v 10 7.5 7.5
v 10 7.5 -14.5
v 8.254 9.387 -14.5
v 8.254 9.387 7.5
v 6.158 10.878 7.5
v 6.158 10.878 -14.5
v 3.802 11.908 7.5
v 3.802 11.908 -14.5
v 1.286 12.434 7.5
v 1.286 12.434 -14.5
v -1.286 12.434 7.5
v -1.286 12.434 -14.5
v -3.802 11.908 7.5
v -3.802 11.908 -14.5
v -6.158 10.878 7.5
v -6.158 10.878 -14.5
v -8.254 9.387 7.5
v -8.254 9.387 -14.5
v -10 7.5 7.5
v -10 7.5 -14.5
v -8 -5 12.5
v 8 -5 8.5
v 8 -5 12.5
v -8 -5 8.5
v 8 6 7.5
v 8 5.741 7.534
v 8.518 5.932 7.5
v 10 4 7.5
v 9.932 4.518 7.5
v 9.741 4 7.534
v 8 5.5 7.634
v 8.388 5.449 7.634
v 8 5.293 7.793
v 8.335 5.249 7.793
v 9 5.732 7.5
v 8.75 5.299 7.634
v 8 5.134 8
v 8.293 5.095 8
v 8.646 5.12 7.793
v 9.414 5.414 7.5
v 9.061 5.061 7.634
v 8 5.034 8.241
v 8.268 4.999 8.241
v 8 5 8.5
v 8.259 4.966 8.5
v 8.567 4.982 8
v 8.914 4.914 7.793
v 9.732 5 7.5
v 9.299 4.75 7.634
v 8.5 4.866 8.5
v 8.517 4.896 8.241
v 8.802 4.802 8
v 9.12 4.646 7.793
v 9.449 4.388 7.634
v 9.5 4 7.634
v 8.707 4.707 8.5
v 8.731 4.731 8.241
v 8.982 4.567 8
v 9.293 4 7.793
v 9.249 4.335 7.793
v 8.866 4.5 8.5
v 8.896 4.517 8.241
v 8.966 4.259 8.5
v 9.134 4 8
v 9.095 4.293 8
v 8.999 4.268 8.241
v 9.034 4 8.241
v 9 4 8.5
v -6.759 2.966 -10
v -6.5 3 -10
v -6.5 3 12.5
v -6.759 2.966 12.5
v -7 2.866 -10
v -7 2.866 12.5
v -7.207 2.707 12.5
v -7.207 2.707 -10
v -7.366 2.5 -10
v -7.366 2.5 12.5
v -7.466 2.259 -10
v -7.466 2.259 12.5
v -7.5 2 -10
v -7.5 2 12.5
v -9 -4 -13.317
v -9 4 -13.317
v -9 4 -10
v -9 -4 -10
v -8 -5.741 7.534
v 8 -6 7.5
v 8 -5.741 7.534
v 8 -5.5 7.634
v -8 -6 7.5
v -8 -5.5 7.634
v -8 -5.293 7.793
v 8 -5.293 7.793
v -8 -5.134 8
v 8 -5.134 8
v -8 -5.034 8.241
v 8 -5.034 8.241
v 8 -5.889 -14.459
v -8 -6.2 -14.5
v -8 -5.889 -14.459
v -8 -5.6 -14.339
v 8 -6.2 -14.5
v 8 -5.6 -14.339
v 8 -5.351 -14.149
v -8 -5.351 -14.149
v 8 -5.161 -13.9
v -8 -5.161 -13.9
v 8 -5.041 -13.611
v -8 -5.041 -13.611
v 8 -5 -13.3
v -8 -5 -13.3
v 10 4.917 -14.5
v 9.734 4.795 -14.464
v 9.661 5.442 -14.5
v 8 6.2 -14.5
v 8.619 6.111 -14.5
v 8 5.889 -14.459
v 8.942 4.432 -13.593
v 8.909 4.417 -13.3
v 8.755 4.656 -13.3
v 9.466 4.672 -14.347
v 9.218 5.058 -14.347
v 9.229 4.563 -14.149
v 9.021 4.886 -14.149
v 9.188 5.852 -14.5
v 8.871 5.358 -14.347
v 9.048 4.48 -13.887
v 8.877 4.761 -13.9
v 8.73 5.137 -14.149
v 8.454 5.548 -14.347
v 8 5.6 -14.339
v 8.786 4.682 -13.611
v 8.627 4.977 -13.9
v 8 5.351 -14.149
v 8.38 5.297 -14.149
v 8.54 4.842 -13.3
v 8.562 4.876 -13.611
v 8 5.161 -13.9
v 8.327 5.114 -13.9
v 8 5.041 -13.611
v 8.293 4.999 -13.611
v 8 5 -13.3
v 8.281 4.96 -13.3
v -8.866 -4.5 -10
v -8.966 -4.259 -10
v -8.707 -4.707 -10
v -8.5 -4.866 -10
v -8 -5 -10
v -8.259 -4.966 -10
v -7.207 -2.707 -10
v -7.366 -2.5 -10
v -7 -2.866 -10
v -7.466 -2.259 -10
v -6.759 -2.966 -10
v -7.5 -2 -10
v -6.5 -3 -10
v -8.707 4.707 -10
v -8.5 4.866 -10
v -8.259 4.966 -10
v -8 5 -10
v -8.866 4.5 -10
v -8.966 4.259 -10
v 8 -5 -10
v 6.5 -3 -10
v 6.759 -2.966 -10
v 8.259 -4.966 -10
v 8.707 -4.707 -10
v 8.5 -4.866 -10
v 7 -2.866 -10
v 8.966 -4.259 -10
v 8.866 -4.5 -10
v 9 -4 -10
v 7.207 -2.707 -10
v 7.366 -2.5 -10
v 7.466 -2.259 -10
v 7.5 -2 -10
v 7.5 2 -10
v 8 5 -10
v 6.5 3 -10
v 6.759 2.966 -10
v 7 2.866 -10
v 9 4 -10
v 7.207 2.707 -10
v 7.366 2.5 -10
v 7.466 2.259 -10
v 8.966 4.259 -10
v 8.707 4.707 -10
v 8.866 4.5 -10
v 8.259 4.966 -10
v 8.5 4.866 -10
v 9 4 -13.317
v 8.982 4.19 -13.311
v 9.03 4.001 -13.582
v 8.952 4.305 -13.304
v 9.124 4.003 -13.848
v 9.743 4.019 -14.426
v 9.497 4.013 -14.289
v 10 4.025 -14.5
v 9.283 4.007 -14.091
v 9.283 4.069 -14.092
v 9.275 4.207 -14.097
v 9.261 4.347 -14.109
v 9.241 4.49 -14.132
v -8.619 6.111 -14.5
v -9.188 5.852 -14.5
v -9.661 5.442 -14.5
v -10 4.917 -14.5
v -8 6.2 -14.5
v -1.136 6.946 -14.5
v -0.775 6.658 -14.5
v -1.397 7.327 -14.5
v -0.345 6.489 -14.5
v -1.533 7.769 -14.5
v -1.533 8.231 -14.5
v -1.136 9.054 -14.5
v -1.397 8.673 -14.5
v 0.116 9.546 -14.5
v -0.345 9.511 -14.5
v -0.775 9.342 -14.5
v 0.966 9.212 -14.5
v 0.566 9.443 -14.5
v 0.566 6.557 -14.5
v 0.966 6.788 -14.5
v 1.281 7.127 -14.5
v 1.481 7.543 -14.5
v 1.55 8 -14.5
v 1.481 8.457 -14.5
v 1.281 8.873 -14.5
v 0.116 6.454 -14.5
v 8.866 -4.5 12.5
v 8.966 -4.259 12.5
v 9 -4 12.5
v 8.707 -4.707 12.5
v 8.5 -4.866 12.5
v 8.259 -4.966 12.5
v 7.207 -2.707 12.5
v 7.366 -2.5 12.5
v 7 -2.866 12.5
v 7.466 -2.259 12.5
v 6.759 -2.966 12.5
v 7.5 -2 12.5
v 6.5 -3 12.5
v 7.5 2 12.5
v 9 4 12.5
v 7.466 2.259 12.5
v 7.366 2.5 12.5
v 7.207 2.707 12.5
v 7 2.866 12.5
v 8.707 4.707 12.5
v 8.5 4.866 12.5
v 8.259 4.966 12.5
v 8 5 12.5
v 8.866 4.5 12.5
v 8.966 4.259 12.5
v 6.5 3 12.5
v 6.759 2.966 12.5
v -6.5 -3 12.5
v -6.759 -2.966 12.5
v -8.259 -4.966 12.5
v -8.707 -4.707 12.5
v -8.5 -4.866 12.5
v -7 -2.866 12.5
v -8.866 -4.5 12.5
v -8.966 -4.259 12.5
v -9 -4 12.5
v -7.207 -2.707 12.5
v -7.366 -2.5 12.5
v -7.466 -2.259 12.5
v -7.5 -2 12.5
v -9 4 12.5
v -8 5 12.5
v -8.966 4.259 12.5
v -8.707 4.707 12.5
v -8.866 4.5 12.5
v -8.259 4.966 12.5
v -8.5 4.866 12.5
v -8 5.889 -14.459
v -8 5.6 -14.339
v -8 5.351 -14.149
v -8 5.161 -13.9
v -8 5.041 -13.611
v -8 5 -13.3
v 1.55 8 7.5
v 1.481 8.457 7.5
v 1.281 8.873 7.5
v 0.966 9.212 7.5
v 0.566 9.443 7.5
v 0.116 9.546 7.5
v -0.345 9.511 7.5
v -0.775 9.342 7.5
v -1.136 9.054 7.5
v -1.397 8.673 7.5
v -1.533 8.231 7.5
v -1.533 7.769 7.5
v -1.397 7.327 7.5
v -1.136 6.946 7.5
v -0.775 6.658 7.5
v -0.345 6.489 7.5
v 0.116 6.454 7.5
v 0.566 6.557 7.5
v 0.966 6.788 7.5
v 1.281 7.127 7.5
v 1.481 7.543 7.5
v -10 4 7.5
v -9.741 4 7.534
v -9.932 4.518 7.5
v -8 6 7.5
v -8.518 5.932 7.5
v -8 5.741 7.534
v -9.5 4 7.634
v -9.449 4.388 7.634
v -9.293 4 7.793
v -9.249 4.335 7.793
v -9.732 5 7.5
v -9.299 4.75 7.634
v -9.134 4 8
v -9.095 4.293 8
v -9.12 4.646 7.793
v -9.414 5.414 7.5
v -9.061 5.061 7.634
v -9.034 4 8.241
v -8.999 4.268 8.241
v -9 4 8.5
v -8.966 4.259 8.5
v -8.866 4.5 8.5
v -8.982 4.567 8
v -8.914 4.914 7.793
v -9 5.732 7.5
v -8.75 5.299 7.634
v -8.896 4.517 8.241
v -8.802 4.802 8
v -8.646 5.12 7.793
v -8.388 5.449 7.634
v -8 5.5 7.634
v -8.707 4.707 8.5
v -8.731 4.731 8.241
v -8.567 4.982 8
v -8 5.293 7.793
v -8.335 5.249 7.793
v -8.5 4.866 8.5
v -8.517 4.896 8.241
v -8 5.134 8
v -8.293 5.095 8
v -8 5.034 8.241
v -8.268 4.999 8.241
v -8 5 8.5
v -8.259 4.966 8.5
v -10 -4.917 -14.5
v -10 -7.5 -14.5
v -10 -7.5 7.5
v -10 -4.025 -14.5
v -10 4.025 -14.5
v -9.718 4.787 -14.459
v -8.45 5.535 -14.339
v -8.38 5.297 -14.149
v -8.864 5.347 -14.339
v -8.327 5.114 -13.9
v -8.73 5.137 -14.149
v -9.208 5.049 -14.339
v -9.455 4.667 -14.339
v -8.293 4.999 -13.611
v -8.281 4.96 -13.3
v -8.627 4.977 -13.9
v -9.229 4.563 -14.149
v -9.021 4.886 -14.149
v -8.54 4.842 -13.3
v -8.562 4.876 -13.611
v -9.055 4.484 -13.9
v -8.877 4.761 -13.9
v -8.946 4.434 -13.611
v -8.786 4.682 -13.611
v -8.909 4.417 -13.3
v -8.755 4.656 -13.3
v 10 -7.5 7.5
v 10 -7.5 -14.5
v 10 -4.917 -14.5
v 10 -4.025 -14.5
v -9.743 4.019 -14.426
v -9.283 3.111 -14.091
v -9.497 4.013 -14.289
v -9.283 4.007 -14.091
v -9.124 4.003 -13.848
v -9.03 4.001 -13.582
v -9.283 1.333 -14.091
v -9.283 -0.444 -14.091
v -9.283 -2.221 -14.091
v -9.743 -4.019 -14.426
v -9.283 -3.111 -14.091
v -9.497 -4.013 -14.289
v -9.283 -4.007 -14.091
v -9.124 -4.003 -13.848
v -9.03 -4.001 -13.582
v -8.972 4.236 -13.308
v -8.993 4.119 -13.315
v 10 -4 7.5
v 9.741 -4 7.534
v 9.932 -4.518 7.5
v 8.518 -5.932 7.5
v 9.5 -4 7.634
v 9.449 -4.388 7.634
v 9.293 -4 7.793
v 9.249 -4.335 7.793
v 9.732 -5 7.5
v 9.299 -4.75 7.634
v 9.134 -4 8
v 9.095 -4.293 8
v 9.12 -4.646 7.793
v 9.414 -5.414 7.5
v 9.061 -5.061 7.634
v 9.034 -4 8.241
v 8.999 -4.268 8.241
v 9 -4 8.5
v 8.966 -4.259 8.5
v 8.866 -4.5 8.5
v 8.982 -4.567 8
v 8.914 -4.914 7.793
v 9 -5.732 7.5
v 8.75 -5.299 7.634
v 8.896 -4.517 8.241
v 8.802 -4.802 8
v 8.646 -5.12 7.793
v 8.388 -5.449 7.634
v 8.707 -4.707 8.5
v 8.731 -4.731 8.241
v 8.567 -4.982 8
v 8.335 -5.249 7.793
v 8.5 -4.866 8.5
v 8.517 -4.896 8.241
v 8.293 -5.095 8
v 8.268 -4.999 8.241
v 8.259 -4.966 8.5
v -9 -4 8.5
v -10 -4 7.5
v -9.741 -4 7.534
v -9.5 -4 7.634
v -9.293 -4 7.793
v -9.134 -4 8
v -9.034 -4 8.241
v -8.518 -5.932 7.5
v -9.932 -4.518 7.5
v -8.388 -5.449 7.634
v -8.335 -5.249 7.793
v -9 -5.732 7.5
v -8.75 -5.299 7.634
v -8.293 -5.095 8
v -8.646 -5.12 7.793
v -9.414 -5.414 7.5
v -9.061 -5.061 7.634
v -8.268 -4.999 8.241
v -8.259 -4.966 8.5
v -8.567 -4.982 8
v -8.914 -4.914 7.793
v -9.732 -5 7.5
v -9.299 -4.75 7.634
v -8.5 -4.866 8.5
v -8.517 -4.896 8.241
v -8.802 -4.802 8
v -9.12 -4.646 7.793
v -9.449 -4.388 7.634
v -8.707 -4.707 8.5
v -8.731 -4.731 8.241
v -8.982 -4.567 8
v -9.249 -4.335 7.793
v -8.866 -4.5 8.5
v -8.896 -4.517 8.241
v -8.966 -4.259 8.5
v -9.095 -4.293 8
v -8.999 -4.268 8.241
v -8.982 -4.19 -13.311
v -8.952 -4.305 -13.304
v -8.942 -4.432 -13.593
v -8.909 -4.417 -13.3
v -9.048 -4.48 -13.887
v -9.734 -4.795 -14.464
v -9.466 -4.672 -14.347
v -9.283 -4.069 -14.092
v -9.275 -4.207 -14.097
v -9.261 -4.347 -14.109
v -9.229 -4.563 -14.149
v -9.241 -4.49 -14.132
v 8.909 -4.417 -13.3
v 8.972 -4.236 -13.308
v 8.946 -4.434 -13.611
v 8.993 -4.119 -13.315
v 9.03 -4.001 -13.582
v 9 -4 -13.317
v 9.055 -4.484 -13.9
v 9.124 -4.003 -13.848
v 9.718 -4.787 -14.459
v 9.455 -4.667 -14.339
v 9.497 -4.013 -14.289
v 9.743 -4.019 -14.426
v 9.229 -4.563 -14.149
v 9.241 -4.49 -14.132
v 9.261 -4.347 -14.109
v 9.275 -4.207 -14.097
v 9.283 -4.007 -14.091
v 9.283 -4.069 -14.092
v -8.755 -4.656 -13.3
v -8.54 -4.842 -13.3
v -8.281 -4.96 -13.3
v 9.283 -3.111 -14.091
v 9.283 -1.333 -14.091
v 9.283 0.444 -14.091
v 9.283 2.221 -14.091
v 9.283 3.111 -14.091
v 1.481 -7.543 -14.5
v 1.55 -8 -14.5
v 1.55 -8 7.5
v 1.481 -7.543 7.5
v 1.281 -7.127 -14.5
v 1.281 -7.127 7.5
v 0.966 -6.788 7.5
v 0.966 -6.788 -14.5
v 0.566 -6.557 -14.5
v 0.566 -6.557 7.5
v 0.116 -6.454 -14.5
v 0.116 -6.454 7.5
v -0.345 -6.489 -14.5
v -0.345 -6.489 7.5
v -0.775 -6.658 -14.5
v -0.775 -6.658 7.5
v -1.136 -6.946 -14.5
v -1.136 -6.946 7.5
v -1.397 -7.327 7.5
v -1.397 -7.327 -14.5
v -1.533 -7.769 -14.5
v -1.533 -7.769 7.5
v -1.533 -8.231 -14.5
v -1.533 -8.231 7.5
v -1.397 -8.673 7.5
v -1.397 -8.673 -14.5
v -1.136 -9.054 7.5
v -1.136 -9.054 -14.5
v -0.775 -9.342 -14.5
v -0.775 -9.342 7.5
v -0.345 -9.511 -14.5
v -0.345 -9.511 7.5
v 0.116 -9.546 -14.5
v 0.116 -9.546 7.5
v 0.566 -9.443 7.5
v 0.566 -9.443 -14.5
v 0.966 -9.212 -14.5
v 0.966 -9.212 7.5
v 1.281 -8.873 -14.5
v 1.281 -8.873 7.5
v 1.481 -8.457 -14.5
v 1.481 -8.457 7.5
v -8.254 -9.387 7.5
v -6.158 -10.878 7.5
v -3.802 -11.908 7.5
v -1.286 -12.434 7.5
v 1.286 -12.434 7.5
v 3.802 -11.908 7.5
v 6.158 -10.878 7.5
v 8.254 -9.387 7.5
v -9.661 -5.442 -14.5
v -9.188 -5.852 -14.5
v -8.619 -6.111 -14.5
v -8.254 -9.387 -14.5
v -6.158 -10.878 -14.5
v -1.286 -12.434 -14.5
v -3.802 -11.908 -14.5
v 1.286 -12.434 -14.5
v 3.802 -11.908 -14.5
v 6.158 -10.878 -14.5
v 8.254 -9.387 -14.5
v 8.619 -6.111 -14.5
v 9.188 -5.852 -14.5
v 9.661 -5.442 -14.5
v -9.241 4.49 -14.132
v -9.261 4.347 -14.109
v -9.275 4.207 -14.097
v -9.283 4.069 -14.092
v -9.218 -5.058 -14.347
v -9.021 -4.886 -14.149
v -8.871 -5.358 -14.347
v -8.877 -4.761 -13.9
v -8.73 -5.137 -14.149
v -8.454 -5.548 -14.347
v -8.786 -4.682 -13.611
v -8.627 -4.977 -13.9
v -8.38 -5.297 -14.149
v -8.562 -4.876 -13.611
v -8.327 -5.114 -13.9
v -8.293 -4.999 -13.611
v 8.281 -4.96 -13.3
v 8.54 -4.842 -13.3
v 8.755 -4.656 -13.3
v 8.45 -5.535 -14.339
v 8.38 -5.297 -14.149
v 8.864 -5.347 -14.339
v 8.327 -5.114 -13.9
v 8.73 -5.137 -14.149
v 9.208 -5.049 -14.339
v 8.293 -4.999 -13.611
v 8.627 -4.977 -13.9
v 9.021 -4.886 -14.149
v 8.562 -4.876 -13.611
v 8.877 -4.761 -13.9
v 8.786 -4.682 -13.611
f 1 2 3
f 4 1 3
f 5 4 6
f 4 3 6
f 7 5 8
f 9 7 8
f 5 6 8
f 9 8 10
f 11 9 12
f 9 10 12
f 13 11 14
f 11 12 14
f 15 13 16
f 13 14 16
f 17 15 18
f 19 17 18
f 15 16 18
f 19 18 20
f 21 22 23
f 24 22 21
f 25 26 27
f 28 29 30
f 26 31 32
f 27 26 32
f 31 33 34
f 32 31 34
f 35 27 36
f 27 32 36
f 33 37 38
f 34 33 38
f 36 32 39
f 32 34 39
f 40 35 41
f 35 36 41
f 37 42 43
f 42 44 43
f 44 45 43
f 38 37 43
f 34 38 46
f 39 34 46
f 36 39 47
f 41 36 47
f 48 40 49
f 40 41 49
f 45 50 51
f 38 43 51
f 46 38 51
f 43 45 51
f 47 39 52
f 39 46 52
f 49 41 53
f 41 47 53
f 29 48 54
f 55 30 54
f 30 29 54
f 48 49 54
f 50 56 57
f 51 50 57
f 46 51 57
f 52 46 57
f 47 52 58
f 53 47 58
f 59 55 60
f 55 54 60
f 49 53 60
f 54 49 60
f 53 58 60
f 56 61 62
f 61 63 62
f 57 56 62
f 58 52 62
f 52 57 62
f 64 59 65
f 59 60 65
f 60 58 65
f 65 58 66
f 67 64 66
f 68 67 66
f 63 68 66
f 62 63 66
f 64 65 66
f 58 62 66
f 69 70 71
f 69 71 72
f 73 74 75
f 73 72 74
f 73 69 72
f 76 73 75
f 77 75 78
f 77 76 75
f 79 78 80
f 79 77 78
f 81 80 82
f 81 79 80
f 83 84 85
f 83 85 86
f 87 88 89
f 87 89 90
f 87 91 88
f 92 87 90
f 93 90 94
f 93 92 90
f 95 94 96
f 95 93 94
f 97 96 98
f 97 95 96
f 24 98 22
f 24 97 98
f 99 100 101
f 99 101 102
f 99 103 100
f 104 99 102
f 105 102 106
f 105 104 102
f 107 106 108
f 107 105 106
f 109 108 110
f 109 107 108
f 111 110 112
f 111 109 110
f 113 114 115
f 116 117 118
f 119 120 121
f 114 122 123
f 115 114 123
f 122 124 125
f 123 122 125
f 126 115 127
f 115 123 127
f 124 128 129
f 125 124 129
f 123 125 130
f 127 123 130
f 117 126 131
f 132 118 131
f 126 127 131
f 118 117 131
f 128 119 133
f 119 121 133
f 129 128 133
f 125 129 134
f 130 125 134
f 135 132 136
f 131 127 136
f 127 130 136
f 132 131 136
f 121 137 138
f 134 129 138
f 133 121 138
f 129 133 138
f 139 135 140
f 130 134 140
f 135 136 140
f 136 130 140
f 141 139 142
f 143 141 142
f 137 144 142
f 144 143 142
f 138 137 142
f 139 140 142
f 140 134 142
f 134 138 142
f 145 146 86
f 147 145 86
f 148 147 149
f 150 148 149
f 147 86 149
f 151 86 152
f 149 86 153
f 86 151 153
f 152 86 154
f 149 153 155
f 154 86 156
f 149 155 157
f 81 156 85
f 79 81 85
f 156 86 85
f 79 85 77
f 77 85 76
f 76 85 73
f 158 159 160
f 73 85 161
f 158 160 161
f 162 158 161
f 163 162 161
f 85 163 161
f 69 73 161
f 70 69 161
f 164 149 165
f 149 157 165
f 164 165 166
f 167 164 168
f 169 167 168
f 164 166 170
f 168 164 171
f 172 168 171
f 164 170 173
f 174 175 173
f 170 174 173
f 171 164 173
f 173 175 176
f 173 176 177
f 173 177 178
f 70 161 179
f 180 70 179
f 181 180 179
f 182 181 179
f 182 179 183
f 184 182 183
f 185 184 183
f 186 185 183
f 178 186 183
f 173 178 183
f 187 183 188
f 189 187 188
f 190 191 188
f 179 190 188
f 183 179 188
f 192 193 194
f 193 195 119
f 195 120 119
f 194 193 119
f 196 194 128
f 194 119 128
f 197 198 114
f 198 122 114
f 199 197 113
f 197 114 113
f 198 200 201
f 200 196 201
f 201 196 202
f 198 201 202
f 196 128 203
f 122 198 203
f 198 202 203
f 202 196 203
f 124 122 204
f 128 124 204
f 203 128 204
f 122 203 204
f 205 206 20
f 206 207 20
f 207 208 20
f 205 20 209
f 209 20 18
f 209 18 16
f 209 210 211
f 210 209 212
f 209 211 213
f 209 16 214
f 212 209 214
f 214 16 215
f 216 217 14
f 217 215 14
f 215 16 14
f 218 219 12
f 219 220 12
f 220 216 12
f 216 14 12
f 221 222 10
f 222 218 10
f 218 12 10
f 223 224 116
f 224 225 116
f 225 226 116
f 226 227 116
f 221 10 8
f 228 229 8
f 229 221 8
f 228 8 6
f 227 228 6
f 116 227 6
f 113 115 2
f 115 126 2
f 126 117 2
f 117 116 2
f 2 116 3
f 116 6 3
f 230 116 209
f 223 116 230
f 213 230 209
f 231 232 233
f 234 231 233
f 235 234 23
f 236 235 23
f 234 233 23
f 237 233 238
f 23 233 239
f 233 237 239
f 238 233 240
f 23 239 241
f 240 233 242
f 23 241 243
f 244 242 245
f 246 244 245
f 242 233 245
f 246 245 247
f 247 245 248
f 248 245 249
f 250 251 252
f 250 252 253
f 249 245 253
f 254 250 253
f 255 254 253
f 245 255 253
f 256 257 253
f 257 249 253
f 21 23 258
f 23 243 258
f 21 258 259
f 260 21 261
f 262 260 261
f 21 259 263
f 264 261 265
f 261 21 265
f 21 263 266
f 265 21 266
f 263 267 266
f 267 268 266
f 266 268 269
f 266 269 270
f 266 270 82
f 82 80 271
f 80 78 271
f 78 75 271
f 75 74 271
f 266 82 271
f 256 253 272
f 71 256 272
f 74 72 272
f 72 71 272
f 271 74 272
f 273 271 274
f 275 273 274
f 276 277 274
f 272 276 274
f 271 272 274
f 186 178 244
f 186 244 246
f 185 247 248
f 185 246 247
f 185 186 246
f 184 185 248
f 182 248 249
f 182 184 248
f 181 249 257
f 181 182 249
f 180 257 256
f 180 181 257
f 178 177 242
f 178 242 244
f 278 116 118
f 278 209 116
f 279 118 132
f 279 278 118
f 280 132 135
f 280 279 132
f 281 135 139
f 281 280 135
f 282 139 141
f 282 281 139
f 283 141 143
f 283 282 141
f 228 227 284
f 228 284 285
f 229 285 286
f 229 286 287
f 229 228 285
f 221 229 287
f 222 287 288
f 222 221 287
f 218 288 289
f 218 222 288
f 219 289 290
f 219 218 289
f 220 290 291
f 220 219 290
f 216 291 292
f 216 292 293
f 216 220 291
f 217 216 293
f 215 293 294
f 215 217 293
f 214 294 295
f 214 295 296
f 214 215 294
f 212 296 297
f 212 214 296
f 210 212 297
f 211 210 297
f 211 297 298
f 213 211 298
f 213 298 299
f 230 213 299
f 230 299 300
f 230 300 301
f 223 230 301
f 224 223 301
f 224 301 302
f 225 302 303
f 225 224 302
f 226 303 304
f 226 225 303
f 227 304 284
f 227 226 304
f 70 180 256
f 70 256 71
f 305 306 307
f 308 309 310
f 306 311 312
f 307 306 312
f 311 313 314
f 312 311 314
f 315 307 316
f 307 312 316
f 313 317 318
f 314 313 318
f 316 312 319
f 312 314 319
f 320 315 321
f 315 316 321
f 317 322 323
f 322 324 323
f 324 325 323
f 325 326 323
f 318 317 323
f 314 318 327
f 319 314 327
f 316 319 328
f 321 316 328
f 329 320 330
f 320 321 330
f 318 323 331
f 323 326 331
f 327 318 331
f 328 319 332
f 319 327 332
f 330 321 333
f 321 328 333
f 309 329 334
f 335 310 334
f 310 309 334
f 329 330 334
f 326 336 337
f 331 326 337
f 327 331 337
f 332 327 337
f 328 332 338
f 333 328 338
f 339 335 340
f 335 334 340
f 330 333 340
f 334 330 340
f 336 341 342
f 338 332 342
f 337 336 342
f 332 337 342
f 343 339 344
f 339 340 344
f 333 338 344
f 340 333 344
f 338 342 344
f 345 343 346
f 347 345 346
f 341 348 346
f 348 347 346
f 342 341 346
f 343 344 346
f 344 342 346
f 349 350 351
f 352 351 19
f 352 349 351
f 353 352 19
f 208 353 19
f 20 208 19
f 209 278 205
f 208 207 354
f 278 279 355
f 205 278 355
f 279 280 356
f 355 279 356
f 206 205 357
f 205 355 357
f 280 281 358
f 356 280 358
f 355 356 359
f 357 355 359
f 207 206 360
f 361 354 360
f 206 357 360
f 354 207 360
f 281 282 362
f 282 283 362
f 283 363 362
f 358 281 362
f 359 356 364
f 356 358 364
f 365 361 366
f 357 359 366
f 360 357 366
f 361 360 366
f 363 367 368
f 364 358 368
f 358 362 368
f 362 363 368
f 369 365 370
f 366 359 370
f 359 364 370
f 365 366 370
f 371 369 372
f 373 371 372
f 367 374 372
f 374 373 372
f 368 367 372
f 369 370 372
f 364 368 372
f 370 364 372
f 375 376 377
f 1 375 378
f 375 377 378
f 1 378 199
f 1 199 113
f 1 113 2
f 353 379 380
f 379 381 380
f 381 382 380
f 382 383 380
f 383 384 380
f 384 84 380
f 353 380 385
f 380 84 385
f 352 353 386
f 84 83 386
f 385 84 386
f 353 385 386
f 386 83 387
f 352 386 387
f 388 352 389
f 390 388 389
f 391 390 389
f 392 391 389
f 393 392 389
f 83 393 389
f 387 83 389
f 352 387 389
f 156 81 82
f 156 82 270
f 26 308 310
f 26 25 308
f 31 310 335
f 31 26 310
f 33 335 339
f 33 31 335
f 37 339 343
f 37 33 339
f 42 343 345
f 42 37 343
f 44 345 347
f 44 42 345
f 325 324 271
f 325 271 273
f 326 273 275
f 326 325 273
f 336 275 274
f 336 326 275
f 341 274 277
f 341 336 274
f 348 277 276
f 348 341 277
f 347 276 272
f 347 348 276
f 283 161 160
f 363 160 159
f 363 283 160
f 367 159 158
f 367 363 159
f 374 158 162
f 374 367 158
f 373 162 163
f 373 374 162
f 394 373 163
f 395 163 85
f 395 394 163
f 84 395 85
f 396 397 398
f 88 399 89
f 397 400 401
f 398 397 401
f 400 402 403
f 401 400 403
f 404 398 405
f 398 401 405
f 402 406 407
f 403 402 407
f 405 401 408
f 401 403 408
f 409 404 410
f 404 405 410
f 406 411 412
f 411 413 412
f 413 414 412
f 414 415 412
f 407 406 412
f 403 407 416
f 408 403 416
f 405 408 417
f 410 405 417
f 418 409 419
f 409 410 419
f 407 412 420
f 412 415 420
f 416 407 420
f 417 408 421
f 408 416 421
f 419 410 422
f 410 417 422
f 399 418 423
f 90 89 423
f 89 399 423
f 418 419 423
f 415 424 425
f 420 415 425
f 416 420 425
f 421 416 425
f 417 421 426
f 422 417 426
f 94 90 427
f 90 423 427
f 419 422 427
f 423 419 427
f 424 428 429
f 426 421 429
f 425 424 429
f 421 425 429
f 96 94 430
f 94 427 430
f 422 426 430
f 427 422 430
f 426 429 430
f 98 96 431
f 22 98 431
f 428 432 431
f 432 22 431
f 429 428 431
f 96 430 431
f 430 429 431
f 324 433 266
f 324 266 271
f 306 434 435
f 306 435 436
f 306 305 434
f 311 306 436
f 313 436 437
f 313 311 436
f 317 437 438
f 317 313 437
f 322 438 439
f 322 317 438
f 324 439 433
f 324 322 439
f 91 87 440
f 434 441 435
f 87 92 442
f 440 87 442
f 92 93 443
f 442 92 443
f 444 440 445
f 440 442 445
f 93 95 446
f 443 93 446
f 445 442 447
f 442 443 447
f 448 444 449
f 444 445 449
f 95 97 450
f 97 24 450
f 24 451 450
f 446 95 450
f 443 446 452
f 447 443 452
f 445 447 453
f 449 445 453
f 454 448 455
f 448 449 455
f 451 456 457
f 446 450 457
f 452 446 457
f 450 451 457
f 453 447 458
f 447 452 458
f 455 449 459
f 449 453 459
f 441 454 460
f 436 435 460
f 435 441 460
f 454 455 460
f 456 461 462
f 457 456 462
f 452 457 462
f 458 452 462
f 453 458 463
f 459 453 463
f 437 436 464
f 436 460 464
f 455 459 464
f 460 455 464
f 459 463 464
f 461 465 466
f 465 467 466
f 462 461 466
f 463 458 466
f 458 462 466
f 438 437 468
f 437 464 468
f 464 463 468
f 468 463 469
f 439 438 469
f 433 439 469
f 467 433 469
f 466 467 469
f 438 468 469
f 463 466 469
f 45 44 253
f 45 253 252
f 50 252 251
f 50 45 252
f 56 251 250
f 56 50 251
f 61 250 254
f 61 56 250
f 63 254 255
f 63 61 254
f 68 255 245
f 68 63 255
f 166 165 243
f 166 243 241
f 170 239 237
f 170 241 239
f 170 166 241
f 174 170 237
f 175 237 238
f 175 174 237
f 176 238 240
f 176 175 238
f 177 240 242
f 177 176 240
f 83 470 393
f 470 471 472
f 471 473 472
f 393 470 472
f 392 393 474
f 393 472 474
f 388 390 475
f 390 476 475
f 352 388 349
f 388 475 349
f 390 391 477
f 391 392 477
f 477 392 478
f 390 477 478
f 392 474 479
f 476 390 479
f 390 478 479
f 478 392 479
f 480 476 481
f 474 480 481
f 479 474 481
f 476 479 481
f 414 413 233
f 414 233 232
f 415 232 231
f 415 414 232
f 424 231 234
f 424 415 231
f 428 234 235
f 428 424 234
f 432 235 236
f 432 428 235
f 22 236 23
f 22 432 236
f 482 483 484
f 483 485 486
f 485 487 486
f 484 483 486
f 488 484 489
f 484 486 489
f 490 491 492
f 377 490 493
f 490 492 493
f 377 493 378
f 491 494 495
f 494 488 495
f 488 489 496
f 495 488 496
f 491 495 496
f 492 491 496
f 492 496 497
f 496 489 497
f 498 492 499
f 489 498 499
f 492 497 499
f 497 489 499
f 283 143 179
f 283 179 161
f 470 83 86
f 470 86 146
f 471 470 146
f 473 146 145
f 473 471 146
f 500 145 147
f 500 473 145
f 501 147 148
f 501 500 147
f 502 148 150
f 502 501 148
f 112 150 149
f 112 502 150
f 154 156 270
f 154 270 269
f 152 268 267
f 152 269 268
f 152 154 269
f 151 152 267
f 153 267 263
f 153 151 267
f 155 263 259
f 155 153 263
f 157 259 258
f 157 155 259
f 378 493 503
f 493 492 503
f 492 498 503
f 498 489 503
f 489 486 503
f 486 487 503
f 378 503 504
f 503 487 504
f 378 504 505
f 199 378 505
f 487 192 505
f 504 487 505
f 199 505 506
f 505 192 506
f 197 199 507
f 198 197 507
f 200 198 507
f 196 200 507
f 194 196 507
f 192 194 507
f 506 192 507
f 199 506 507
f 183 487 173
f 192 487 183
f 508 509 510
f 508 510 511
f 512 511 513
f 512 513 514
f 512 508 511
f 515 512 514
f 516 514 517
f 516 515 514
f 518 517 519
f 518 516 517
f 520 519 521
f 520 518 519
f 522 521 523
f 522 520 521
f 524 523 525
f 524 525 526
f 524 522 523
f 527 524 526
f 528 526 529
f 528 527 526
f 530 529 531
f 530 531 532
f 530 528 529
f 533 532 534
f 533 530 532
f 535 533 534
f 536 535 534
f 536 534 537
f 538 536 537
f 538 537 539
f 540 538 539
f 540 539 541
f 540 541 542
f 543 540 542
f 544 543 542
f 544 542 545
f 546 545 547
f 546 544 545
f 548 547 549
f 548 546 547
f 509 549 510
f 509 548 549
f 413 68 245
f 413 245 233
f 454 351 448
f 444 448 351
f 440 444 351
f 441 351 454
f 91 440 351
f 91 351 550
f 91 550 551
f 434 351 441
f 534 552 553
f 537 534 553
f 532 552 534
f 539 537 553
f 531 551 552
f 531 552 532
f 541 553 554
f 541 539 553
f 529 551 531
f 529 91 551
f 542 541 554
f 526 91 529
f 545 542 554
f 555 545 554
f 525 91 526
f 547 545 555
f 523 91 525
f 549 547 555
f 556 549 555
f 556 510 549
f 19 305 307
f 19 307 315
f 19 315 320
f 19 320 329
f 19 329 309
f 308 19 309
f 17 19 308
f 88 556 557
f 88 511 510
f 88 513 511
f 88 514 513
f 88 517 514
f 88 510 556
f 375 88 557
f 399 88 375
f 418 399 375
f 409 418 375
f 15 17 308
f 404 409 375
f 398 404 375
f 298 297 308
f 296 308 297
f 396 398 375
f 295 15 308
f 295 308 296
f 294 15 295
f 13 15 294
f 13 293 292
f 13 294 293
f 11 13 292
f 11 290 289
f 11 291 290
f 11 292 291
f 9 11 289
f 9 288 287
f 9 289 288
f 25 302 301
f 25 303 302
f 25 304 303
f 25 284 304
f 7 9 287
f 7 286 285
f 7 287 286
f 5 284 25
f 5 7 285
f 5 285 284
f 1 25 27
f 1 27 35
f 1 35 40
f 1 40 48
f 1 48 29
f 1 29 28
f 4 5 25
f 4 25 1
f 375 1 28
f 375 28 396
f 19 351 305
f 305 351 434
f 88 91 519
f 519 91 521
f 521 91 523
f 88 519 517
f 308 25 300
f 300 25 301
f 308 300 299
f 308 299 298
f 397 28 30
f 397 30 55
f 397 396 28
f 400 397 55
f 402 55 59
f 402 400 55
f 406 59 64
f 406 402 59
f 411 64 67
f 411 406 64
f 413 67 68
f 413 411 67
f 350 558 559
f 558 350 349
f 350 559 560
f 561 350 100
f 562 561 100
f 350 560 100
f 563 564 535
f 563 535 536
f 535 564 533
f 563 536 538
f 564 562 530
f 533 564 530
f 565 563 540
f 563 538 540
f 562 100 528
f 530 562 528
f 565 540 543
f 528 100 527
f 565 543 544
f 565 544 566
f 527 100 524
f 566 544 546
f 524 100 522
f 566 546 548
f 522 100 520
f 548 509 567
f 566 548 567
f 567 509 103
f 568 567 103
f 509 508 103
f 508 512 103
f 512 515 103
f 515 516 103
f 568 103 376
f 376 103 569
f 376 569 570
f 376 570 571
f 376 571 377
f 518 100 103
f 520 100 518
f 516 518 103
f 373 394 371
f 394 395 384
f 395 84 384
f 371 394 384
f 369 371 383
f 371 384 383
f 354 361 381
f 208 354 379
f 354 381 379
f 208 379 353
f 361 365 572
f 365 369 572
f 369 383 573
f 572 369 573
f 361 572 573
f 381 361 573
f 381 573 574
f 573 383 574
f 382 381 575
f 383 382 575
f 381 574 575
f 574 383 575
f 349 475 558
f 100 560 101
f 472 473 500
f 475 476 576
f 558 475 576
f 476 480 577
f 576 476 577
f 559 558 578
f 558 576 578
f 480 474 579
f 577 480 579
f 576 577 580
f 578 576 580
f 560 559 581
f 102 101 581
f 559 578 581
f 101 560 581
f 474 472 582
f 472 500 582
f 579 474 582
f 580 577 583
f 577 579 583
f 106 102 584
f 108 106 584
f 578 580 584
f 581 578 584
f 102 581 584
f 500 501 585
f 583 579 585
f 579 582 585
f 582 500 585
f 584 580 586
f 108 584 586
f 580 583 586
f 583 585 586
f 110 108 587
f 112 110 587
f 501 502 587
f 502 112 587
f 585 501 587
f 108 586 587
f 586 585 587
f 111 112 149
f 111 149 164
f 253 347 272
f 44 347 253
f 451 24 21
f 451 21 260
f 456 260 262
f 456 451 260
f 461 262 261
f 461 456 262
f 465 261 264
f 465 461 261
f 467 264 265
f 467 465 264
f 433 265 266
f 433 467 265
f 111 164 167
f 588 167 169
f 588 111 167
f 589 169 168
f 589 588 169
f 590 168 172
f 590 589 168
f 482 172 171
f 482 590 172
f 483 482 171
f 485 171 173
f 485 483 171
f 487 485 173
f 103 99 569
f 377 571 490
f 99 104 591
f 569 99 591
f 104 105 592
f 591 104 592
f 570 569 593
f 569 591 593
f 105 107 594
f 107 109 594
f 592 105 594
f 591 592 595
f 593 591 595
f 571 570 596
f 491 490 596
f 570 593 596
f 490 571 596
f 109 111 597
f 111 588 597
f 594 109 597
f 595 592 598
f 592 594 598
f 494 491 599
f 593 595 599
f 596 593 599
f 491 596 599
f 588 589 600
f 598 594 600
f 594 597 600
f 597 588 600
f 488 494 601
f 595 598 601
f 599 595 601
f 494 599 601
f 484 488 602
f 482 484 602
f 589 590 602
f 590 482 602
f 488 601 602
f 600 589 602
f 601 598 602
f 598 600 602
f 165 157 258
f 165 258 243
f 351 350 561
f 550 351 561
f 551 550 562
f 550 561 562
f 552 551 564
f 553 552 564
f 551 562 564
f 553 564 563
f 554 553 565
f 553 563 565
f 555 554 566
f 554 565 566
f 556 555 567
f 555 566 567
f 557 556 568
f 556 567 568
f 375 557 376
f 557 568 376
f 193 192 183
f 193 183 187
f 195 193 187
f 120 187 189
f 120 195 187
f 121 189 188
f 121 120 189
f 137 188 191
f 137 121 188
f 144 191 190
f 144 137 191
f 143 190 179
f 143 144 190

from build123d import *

# Parameters (mm, degrees)
AUFSATZ_LINEAR_AUSTRAGEN1_DEPTH      = 7.5
AUFSATZ_LINEAR_AUSTRAGEN1_DEPTH_BACK = 14.5
SKIZZE1_R                            = 12.5
SKIZZE1_R_2                          = 1.55
SCHNITT_LINEAR_AUSTRAGEN1_DEPTH      = 4.5
AUFSATZ_LINEAR_AUSTRAGEN2_DEPTH      = 5
SCHNITT_LINEAR_AUSTRAGEN4_DEPTH      = 23.86372673
SCHNITT_LINEAR_AUSTRAGEN4_DEPTH_BACK = 23.86372673
SCHNITT_LINEAR_AUSTRAGEN5_DEPTH      = 10
SCHNITT_LINEAR_AUSTRAGEN5_DEPTH_BACK = 23.86372673
SKIZZE5_OUTSIDE_W                    = 35.898
SKIZZE5_OUTSIDE_H                    = 35.898
SKIZZE5_OUTSIDE_W_2                  = 20
SKIZZE5_OUTSIDE_H_2                  = 30
VERRUNDUNG1_R                        = 1.2
VERRUNDUNG2_R                        = 1


with BuildPart() as part:
    # Skizze1 → Aufsatz-Linear austragen1 (new, two sides: drawn at the far end of the back side and taken through both)
    with BuildSketch(Plane.XY.offset(-AUFSATZ_LINEAR_AUSTRAGEN1_DEPTH_BACK)):
        Circle(SKIZZE1_R)
        with Locations((0, 8)):
            Circle(SKIZZE1_R_2, mode=Mode.SUBTRACT)
        with Locations((0, -8)):
            Circle(SKIZZE1_R_2, mode=Mode.SUBTRACT)
    extrude(amount=AUFSATZ_LINEAR_AUSTRAGEN1_DEPTH + AUFSATZ_LINEAR_AUSTRAGEN1_DEPTH_BACK)

    # Skizze2 → Schnitt-Linear austragen1 (cut)
    with BuildSketch(Plane(origin=(0, 0, -14.5), x_dir=(-1, 0, 0), z_dir=(0, 0, -1))):
        with BuildLine():
            Line((-9, -4), (-9, 4))
            ThreePointArc((-9, 4), (-8.707106781, 4.707106781), (-8, 5))
            Line((-8, 5), (8, 5))
            ThreePointArc((8, 5), (8.707106781, 4.707106781), (9, 4))
            Line((9, 4), (9, -4))
            ThreePointArc((9, -4), (8.707106781, -4.707106781), (8, -5))
            Line((8, -5), (-8, -5))
            ThreePointArc((-8, -5), (-8.707106781, -4.707106781), (-9, -4))
        make_face()
    extrude(amount=-SCHNITT_LINEAR_AUSTRAGEN1_DEPTH, mode=Mode.SUBTRACT)

    # Skizze3 → Aufsatz-Linear austragen2 (add)
    with BuildSketch(Plane.XY.offset(7.5)):
        with BuildLine():
            Line((-8, 5), (8, 5))
            ThreePointArc((8, 5), (8.707106781, 4.707106781), (9, 4))
            Line((9, 4), (9, -4))
            ThreePointArc((9, -4), (8.707106781, -4.707106781), (8, -5))
            Line((8, -5), (-8, -5))
            ThreePointArc((-8, -5), (-8.707106781, -4.707106781), (-9, -4))
            Line((-9, -4), (-9, 4))
            ThreePointArc((-9, 4), (-8.707106781, 4.707106781), (-8, 5))
        make_face()
    extrude(amount=AUFSATZ_LINEAR_AUSTRAGEN2_DEPTH)

    # Skizze4 → Schnitt-Linear austragen4 (cut, two sides: drawn at the far end of the back side and taken through both)
    with BuildSketch(Plane.XY.offset(-SCHNITT_LINEAR_AUSTRAGEN4_DEPTH_BACK)):
        with BuildLine():
            Line((-6.5, -3), (6.5, -3))
            ThreePointArc((6.5, -3), (7.207106781, -2.707106781), (7.5, -2))
            Line((7.5, -2), (7.5, 2))
            ThreePointArc((7.5, 2), (7.207106781, 2.707106781), (6.5, 3))
            Line((6.5, 3), (-6.5, 3))
            ThreePointArc((-6.5, 3), (-7.207106781, 2.707106781), (-7.5, 2))
            Line((-7.5, 2), (-7.5, -2))
            ThreePointArc((-7.5, -2), (-7.207106781, -2.707106781), (-6.5, -3))
        make_face()
    extrude(amount=SCHNITT_LINEAR_AUSTRAGEN4_DEPTH + SCHNITT_LINEAR_AUSTRAGEN4_DEPTH_BACK, mode=Mode.SUBTRACT)

    # Skizze5 outside → Schnitt-Linear austragen5 (cut, two sides: drawn at the far end of the back side and taken through both)
    with BuildSketch(Plane.XY.offset(-SCHNITT_LINEAR_AUSTRAGEN5_DEPTH_BACK)):
        Rectangle(SKIZZE5_OUTSIDE_W, SKIZZE5_OUTSIDE_H)
        Rectangle(SKIZZE5_OUTSIDE_W_2, SKIZZE5_OUTSIDE_H_2, mode=Mode.SUBTRACT)
    extrude(amount=SCHNITT_LINEAR_AUSTRAGEN5_DEPTH + SCHNITT_LINEAR_AUSTRAGEN5_DEPTH_BACK, mode=Mode.SUBTRACT)

    # Verrundung1
    verrundung1_edges = [part.edges().sort_by_distance(p)[0] for p in [
        (-8.707106781, 4.707106781, -14.5),
        (-8.707106781, -4.707106781, -14.5),
        (0, -5, -14.5),
        (8.707106781, -4.707106781, -14.5),
        (8.707106781, 4.707106781, -14.5),
        (0, 5, -14.5),
    ]]
    fillet(verrundung1_edges, radius=VERRUNDUNG1_R)

    # Verrundung2
    verrundung2_edges = [part.edges().sort_by_distance(p)[0] for p in [
        (8.707106781, 4.707106781, 7.5),
        (0, 5, 7.5),
        (-8.707106781, 4.707106781, 7.5),
        (-9, 0, 7.5),
        (-8.707106781, -4.707106781, 7.5),
        (0, -5, 7.5),
        (8.707106781, -4.707106781, 7.5),
        (9, 0, 7.5),
    ]]
    fillet(verrundung2_edges, radius=VERRUNDUNG2_R - 0.0001)  # a hair under: the kernel refuses the full size


solid = part.part
